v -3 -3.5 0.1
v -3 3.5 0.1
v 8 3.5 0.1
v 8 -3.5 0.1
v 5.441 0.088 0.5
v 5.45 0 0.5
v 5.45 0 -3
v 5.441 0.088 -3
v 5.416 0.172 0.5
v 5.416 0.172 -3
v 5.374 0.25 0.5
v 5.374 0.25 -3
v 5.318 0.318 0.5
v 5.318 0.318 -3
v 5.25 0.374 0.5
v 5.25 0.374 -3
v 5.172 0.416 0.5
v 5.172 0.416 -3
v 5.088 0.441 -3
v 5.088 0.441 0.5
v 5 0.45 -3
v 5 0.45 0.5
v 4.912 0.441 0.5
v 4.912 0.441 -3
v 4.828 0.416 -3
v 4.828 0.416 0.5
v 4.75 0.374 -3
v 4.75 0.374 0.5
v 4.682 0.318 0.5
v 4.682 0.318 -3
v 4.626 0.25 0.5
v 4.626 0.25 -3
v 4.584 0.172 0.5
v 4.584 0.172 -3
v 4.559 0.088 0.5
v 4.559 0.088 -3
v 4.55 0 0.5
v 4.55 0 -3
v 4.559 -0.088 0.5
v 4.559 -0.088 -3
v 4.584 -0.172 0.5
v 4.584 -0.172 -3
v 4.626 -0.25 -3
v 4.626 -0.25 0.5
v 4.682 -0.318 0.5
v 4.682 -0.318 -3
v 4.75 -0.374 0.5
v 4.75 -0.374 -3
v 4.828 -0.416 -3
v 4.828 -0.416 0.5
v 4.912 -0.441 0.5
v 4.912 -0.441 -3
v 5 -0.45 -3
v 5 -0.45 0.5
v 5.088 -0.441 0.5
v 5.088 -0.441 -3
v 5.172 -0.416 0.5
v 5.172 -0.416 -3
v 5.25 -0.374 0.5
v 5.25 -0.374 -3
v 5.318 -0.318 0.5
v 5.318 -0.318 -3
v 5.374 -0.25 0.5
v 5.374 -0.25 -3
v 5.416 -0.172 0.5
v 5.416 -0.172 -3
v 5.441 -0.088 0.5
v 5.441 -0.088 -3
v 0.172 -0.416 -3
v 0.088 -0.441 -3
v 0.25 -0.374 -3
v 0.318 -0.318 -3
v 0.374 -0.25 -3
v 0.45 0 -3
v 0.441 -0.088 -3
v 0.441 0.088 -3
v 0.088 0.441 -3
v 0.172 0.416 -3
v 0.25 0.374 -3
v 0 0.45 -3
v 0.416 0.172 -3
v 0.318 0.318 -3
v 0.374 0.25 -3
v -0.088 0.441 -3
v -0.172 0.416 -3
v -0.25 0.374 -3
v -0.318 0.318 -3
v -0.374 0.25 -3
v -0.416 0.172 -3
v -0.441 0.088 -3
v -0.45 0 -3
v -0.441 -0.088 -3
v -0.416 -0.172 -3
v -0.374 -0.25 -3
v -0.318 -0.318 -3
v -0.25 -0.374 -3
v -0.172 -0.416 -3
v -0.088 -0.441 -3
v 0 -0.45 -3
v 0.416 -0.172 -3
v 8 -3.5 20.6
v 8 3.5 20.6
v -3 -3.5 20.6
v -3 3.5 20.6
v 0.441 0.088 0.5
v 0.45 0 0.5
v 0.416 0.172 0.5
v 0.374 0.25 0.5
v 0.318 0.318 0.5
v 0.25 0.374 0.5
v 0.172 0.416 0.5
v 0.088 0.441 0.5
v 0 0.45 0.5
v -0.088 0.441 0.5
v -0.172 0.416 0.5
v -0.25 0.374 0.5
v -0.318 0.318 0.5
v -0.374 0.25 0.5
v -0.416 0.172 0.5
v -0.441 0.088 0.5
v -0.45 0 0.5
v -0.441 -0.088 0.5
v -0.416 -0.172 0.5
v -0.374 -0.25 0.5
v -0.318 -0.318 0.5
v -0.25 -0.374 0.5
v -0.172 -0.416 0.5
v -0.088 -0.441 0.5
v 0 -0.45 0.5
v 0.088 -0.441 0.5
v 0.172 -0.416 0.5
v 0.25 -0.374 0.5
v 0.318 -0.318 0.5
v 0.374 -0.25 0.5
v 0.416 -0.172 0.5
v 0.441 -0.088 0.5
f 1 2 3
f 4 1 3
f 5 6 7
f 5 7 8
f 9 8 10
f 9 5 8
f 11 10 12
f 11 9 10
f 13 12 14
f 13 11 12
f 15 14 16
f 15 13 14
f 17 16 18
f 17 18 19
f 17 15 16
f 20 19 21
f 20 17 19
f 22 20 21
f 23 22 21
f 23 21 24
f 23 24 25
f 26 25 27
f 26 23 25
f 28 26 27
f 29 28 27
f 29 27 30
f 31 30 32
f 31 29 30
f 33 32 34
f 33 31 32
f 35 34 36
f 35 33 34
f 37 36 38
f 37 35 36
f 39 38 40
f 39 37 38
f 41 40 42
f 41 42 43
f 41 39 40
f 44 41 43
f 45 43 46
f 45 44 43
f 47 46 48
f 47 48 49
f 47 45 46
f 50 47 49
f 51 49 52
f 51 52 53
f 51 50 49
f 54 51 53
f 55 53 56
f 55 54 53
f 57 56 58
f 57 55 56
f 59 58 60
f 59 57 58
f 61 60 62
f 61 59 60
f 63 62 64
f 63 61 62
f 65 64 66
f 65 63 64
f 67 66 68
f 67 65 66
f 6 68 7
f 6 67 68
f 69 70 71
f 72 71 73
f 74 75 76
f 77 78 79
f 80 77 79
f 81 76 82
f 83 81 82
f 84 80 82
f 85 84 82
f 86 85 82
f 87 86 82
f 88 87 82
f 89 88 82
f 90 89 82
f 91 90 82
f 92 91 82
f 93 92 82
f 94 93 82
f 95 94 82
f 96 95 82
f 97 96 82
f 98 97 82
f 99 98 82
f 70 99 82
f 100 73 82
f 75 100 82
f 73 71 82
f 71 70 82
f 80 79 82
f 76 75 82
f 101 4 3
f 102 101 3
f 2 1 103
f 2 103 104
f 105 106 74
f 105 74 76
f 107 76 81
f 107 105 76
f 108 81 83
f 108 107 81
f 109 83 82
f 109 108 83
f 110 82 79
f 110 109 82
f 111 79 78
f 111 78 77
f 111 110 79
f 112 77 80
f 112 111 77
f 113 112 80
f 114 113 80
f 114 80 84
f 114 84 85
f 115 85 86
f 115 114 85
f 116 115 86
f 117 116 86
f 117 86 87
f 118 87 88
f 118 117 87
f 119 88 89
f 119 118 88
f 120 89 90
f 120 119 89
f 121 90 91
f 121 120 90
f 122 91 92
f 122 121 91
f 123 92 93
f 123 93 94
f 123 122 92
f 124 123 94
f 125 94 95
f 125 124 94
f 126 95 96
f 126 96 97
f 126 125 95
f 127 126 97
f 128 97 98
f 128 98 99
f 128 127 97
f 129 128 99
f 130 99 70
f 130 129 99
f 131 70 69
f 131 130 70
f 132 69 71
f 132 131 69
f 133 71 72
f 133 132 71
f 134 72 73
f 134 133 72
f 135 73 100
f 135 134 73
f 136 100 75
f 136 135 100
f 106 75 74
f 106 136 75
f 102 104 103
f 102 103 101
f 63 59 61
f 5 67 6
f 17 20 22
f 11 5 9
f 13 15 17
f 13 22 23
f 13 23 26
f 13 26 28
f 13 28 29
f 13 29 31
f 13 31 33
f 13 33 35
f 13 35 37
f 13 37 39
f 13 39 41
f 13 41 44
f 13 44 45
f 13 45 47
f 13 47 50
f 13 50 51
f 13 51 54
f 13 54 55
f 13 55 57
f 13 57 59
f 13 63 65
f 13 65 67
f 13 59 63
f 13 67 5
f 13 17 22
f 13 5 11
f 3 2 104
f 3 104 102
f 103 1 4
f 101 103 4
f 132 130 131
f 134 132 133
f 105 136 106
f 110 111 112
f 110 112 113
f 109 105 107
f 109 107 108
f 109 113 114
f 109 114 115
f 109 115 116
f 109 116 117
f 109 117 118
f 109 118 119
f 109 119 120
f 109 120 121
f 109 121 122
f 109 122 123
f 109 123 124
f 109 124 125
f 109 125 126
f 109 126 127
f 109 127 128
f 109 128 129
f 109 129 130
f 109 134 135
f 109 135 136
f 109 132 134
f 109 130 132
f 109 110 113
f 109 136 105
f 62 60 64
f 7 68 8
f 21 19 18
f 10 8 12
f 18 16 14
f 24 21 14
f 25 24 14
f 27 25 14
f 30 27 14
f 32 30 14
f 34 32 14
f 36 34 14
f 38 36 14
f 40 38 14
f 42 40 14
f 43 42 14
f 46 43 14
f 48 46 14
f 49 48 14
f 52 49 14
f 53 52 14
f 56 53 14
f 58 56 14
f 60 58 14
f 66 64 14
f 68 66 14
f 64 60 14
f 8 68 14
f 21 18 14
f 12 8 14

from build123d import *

# Parameters (mm, degrees)
SKETCH_W     = 11
SKETCH_H     = 7
PAD_DEPTH    = 20.5
SKETCH001_R  = 0.45
PAD001_DEPTH = 3.5


with BuildPart() as pad:
    # Sketch → Pad (new body)
    with BuildSketch(Plane.XY.offset(0.1)):
        with Locations((2.5, 0)):
            Rectangle(SKETCH_W, SKETCH_H)
    extrude(amount=PAD_DEPTH)


with BuildPart() as pad001:
    # Sketch001 → Pad001 (new body)
    with BuildSketch(Plane.XY.offset(0.5)):
        Circle(SKETCH001_R)
        with Locations((5, 0)):
            Circle(SKETCH001_R)
    extrude(amount=-PAD001_DEPTH)


solid = Compound([pad.part, pad001.part])
